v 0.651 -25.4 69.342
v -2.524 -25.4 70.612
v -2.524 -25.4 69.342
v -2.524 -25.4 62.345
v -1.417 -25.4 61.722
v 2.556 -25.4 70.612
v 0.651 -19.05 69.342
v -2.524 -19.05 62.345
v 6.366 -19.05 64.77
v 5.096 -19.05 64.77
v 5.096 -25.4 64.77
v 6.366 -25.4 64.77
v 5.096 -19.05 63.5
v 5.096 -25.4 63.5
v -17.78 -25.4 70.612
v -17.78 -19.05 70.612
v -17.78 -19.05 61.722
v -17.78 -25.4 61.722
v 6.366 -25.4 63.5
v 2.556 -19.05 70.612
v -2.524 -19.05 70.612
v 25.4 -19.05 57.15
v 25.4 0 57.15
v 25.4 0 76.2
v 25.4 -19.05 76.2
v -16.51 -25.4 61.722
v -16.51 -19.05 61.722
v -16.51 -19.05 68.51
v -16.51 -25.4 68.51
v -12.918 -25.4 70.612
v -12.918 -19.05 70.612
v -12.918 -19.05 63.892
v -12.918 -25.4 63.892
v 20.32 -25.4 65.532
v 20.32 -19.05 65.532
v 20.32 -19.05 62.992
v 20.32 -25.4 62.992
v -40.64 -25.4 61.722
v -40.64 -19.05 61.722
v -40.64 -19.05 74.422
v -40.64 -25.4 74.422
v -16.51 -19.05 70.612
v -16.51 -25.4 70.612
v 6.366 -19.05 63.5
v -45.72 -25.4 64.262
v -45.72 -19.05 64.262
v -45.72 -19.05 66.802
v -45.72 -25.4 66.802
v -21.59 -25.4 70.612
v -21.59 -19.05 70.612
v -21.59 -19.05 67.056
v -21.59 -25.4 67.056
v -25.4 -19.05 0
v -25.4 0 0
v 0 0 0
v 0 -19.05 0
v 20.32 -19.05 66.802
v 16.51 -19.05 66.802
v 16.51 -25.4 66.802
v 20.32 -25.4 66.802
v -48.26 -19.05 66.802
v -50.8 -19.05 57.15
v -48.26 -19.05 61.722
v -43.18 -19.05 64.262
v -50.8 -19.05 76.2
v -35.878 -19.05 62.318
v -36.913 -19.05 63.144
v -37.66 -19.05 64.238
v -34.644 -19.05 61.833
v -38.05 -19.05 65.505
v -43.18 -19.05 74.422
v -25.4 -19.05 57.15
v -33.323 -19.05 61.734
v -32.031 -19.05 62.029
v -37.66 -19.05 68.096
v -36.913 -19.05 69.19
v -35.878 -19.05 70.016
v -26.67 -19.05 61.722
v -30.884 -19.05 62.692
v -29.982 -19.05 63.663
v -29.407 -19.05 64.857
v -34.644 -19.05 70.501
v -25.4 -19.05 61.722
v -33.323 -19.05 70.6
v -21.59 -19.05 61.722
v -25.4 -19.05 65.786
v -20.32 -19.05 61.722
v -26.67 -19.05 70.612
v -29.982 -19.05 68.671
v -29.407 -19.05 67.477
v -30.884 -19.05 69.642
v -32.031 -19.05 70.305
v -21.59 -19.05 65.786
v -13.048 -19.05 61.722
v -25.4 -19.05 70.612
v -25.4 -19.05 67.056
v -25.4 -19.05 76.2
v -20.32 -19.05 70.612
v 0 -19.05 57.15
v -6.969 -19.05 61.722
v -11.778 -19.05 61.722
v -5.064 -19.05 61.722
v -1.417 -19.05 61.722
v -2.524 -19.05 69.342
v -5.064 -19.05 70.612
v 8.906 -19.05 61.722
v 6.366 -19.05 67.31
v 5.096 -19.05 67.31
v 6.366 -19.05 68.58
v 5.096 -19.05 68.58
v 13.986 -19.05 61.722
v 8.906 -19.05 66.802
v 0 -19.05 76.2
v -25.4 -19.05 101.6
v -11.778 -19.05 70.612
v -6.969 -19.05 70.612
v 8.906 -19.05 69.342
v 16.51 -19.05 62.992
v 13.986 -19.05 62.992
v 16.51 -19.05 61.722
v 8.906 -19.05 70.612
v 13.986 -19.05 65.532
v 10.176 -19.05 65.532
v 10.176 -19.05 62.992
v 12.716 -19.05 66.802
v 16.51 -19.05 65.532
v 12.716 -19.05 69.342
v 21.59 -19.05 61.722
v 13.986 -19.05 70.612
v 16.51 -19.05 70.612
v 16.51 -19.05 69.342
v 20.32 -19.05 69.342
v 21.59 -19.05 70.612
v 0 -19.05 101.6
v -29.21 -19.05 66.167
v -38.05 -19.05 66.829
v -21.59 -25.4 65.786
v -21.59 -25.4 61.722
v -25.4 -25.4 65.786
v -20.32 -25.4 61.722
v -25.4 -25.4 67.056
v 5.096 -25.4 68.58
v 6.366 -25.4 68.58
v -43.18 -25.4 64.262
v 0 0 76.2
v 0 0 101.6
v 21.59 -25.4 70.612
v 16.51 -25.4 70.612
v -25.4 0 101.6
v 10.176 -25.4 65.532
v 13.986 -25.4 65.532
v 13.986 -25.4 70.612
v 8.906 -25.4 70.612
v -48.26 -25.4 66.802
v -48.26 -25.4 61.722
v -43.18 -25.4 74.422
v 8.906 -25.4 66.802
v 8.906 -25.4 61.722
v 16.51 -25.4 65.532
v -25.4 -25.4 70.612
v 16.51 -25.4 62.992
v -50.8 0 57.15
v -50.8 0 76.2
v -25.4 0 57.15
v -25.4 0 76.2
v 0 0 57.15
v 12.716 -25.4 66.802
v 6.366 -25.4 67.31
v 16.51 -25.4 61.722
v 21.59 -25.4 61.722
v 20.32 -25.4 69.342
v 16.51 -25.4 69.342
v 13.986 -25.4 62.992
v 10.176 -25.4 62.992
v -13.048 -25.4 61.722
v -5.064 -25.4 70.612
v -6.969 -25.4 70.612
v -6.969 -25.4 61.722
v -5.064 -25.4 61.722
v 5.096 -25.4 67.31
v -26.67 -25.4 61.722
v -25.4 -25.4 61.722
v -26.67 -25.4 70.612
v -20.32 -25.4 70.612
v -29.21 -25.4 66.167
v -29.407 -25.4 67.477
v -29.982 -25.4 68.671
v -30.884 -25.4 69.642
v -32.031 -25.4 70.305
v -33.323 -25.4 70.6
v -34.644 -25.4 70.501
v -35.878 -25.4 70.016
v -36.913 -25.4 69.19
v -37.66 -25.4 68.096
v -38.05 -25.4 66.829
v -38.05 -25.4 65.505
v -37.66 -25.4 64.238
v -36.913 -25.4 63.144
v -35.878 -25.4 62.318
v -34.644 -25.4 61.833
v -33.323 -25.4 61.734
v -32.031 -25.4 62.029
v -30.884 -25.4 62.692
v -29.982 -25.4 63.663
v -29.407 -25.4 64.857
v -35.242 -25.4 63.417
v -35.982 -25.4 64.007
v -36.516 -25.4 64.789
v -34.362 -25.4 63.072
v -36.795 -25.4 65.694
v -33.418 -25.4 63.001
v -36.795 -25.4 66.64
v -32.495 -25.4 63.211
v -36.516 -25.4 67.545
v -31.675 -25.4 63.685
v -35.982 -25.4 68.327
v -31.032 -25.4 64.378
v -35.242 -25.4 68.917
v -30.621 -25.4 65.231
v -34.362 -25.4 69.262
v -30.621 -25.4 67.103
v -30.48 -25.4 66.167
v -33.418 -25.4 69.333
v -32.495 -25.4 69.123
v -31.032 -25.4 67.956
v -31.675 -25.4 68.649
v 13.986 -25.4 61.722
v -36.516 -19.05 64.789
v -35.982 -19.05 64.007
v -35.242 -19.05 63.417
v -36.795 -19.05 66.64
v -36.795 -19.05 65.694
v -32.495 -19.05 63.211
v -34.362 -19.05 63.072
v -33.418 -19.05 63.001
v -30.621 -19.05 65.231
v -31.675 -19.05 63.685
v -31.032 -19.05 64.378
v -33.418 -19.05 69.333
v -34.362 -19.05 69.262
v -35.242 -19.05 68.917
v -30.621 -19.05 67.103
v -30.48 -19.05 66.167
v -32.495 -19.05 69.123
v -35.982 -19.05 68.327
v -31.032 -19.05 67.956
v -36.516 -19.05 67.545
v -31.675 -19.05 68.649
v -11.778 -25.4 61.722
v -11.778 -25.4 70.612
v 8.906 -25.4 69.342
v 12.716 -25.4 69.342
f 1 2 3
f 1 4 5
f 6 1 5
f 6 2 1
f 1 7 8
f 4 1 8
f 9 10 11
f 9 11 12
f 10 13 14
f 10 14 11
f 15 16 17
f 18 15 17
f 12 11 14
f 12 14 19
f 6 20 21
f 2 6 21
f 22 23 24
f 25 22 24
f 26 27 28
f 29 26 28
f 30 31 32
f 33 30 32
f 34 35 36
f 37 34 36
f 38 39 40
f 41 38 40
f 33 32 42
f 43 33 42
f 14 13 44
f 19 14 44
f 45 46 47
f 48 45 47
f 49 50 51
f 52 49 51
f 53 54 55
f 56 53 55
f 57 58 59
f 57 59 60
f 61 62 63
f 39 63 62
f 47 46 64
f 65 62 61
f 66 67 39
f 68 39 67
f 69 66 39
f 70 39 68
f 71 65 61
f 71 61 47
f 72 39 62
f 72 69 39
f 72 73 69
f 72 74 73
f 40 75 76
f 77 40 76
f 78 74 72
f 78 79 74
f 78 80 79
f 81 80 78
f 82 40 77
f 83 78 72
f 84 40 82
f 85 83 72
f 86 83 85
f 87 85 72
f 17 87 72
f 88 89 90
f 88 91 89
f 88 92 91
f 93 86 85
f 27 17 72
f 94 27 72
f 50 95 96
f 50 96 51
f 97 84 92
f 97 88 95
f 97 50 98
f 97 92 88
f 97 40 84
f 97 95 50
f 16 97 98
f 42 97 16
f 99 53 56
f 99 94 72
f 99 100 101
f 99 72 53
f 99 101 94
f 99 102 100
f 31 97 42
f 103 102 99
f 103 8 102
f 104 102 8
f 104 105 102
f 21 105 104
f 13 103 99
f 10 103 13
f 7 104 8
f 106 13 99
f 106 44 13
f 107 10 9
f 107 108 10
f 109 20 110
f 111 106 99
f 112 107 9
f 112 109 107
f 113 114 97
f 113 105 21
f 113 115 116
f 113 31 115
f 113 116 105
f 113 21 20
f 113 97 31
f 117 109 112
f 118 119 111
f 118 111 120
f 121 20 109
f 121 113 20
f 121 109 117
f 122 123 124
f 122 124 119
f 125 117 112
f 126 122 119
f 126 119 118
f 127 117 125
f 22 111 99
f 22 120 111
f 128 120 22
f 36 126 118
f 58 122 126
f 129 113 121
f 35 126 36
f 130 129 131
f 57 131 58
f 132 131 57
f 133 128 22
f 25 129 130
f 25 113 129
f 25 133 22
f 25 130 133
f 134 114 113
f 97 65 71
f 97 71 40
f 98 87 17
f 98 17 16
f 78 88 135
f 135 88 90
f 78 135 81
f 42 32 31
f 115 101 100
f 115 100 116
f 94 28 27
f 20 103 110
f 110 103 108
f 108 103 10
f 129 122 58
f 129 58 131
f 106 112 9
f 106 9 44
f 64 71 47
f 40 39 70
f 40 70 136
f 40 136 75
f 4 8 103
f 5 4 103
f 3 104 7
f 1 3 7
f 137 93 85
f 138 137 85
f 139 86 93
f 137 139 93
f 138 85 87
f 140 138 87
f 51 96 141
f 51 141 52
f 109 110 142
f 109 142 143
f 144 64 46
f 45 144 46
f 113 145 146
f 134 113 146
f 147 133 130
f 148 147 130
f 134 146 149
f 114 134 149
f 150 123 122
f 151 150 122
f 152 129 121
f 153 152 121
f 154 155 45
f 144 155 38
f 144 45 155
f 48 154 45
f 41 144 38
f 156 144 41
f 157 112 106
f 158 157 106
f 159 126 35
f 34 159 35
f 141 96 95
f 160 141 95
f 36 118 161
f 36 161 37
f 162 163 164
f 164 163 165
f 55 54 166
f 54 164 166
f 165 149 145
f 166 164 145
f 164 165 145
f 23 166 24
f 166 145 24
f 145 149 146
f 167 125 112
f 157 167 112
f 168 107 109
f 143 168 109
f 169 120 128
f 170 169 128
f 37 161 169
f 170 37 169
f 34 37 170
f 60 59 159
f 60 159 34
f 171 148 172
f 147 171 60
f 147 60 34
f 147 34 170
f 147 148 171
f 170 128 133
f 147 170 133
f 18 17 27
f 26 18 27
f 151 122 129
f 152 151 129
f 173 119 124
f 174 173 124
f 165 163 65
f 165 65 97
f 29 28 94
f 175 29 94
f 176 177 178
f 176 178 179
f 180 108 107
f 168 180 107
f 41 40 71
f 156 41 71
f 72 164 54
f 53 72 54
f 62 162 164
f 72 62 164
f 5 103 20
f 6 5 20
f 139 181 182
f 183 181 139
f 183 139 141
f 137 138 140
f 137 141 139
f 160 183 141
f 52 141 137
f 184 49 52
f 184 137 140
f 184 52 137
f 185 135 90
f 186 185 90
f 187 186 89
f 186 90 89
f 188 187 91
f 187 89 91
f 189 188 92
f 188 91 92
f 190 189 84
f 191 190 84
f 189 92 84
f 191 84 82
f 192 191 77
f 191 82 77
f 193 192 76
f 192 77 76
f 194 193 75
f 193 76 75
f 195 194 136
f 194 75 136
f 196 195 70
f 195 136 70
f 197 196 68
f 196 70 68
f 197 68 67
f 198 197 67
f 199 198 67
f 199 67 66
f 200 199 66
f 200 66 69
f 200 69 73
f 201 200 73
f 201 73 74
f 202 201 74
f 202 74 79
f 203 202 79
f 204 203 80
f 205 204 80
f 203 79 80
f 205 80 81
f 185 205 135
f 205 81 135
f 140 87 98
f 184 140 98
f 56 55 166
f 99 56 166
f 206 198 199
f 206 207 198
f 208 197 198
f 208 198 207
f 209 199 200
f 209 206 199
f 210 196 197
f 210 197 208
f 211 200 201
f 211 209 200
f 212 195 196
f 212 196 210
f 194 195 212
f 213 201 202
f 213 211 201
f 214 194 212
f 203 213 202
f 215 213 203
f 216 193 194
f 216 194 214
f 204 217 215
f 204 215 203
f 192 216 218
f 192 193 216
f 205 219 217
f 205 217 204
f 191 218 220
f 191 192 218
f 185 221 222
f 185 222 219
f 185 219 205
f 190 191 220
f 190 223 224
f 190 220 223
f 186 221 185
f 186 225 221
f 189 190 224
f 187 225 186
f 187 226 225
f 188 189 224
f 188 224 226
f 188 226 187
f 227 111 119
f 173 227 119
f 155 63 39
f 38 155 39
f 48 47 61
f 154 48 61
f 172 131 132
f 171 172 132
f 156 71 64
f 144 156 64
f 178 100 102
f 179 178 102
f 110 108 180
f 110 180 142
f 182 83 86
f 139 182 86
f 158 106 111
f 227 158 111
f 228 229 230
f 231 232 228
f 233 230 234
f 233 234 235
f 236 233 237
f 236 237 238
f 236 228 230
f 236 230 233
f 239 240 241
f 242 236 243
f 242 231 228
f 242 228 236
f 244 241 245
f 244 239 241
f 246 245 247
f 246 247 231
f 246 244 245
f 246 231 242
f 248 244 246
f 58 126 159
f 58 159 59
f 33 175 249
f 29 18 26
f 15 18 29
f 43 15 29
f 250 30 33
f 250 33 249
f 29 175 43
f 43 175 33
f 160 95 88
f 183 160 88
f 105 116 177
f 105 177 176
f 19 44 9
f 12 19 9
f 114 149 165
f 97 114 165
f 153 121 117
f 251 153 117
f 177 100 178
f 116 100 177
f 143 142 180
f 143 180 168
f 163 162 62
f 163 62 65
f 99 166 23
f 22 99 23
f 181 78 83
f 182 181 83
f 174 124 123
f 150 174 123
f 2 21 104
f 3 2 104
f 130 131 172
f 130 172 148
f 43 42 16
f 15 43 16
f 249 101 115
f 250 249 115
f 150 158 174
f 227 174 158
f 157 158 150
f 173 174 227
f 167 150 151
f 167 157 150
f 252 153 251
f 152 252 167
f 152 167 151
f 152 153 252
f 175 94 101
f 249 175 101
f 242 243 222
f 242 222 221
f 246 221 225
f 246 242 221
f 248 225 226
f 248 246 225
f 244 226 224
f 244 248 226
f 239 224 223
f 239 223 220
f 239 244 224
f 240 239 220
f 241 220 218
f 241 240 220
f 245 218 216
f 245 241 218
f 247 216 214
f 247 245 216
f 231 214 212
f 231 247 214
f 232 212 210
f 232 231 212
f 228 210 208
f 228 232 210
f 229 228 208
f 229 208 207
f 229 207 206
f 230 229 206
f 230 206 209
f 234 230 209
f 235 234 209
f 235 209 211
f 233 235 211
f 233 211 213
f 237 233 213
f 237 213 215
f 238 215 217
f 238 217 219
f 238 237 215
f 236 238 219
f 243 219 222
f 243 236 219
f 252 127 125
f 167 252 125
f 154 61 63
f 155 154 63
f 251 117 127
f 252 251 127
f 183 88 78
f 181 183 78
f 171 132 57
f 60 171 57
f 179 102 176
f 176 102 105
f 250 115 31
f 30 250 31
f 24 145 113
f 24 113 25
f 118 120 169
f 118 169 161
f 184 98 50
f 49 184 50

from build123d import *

# Parameters (mm, degrees)
F0_W      = 25.4
F0_H      = 19.05
F1_DEPTH  = 19.05
F4_DEPTH  = 6.35
F5_R      = 4.445
F5_R_2    = 3.175
F6_DEPTH  = 6.35
F7_W      = 3.81
F7_H      = 1.27
F8_DEPTH  = 6.35
F10_DEPTH = 6.35
F11_W     = 1.905
F11_H     = 8.89
F12_DEPTH = 6.35
F14_DEPTH = 6.35
F15_W     = 1.27
F15_H     = 1.27
F16_DEPTH = 6.35
F18_DEPTH = 6.35
F19_W     = 3.81
F19_H     = 1.27
F20_DEPTH = 6.35


with BuildPart() as f1:
    # F0 (on Front) → F1 (new body)
    with BuildSketch(Plane.XZ):
        Polygon((-25.4, 0), (0, 0), (0, 57.15), (0, 76.2), (0, 101.6), (-25.4, 101.6), (-25.4, 76.2), (-25.4, 57.15), align=None)
        with Locations((12.7, 66.675)):
            Rectangle(F0_W, F0_H)
        with Locations((-38.1, 66.675)):
            Rectangle(F0_W, F0_H)
    extrude(amount=F1_DEPTH)

    # F3 (on offset) → F4 (join)
    with BuildSketch(Plane.XZ.offset(19.05)):
        Polygon((-45.72, 66.802), (-48.26, 66.802), (-48.26, 61.722), (-40.64, 61.722), (-40.64, 74.422), (-43.18, 74.422), (-43.18, 64.262), (-45.72, 64.262), align=None)
    extrude(amount=F4_DEPTH)

    # F5 (on offset) → F6 (join)
    with BuildSketch(Plane.XZ.offset(19.05)):
        with Locations((-33.655, 66.167)):
            Circle(F5_R)
        with Locations((-33.655, 66.167)):
            Circle(F5_R_2, mode=Mode.SUBTRACT)
    extrude(amount=F6_DEPTH)

    # F7 (on offset) → F8 (join)
    with BuildSketch(Plane.XZ.offset(19.05)):
        Polygon((-25.4, 70.612), (-26.67, 70.612), (-26.67, 61.722), (-25.4, 61.722), (-25.4, 65.786055), (-25.4, 67.056055), align=None)
        with Locations((-23.495, 66.421055)):
            Rectangle(F7_W, F7_H)
        Polygon((-21.59, 70.612), (-21.59, 67.056055), (-21.59, 65.786055), (-21.59, 61.722), (-20.32, 61.722), (-20.32, 70.612), align=None)
    extrude(amount=F8_DEPTH)

    # F9 (on offset) → F10 (join)
    with BuildSketch(Plane.XZ.offset(19.05)):
        Polygon((-17.78, 70.612), (-17.78, 61.722), (-16.51, 61.722), (-16.51, 68.510335), (-16.51, 70.612), align=None)
        Polygon((-12.917591, 63.891956), (-16.51, 70.612), (-16.51, 68.510335), (-13.048367, 61.722), (-12.917591, 61.722), align=None)
        Polygon((-12.917591, 70.612), (-12.917591, 63.891956), (-12.917591, 61.722), (-11.778367, 61.722), (-11.778367, 70.612), align=None)
    extrude(amount=F10_DEPTH)

    # F11 (on offset) → F12 (join)
    with BuildSketch(Plane.XZ.offset(19.05)):
        with Locations((-6.016459, 66.167)):
            Rectangle(F11_W, F11_H)
    extrude(amount=F12_DEPTH)

    # F13 (on offset) → F14 (join)
    with BuildSketch(Plane.XZ.offset(19.05)):
        Polygon((2.556041, 70.612), (-2.523959, 70.612), (-2.523959, 69.342), (0.651041, 69.342), (-2.523959, 62.344633), (-1.417059, 61.722), align=None)
    extrude(amount=F14_DEPTH)

    # F15 (on offset) → F16 (join)
    with BuildSketch(Plane.XZ.offset(19.05)):
        with Locations((5.731041, 67.945)):
            Rectangle(F15_W, F15_H)
        with Locations((5.731041, 64.135)):
            Rectangle(F15_W, F15_H)
    extrude(amount=F16_DEPTH)

    # F17 (on offset) → F18 (join)
    with BuildSketch(Plane.XZ.offset(19.05)):
        Polygon((13.986041, 70.612), (8.906041, 70.612), (8.906041, 69.342), (12.716041, 69.342), (12.716041, 66.802), (13.986041, 66.802), align=None)
        Polygon((13.986041, 65.532), (13.986041, 66.802), (12.716041, 66.802), (8.906041, 66.802), (8.906041, 61.722), (13.986041, 61.722), (13.986041, 62.992), (10.176041, 62.992), (10.176041, 65.532), align=None)
    extrude(amount=F18_DEPTH)

    # F19 (on offset) → F20 (join)
    with BuildSketch(Plane.XZ.offset(19.05)):
        with Locations((18.415, 69.977)):
            Rectangle(F19_W, F19_H)
        Polygon((20.32, 70.612), (20.32, 69.342), (20.32, 66.802), (20.32, 65.532), (20.32, 62.992), (20.32, 61.722), (21.59, 61.722), (21.59, 70.612), align=None)
        with Locations((18.415, 66.167)):
            Rectangle(F19_W, F19_H)
        with Locations((18.415, 62.357)):
            Rectangle(F19_W, F19_H)
    extrude(amount=F20_DEPTH)


solid = f1.part
